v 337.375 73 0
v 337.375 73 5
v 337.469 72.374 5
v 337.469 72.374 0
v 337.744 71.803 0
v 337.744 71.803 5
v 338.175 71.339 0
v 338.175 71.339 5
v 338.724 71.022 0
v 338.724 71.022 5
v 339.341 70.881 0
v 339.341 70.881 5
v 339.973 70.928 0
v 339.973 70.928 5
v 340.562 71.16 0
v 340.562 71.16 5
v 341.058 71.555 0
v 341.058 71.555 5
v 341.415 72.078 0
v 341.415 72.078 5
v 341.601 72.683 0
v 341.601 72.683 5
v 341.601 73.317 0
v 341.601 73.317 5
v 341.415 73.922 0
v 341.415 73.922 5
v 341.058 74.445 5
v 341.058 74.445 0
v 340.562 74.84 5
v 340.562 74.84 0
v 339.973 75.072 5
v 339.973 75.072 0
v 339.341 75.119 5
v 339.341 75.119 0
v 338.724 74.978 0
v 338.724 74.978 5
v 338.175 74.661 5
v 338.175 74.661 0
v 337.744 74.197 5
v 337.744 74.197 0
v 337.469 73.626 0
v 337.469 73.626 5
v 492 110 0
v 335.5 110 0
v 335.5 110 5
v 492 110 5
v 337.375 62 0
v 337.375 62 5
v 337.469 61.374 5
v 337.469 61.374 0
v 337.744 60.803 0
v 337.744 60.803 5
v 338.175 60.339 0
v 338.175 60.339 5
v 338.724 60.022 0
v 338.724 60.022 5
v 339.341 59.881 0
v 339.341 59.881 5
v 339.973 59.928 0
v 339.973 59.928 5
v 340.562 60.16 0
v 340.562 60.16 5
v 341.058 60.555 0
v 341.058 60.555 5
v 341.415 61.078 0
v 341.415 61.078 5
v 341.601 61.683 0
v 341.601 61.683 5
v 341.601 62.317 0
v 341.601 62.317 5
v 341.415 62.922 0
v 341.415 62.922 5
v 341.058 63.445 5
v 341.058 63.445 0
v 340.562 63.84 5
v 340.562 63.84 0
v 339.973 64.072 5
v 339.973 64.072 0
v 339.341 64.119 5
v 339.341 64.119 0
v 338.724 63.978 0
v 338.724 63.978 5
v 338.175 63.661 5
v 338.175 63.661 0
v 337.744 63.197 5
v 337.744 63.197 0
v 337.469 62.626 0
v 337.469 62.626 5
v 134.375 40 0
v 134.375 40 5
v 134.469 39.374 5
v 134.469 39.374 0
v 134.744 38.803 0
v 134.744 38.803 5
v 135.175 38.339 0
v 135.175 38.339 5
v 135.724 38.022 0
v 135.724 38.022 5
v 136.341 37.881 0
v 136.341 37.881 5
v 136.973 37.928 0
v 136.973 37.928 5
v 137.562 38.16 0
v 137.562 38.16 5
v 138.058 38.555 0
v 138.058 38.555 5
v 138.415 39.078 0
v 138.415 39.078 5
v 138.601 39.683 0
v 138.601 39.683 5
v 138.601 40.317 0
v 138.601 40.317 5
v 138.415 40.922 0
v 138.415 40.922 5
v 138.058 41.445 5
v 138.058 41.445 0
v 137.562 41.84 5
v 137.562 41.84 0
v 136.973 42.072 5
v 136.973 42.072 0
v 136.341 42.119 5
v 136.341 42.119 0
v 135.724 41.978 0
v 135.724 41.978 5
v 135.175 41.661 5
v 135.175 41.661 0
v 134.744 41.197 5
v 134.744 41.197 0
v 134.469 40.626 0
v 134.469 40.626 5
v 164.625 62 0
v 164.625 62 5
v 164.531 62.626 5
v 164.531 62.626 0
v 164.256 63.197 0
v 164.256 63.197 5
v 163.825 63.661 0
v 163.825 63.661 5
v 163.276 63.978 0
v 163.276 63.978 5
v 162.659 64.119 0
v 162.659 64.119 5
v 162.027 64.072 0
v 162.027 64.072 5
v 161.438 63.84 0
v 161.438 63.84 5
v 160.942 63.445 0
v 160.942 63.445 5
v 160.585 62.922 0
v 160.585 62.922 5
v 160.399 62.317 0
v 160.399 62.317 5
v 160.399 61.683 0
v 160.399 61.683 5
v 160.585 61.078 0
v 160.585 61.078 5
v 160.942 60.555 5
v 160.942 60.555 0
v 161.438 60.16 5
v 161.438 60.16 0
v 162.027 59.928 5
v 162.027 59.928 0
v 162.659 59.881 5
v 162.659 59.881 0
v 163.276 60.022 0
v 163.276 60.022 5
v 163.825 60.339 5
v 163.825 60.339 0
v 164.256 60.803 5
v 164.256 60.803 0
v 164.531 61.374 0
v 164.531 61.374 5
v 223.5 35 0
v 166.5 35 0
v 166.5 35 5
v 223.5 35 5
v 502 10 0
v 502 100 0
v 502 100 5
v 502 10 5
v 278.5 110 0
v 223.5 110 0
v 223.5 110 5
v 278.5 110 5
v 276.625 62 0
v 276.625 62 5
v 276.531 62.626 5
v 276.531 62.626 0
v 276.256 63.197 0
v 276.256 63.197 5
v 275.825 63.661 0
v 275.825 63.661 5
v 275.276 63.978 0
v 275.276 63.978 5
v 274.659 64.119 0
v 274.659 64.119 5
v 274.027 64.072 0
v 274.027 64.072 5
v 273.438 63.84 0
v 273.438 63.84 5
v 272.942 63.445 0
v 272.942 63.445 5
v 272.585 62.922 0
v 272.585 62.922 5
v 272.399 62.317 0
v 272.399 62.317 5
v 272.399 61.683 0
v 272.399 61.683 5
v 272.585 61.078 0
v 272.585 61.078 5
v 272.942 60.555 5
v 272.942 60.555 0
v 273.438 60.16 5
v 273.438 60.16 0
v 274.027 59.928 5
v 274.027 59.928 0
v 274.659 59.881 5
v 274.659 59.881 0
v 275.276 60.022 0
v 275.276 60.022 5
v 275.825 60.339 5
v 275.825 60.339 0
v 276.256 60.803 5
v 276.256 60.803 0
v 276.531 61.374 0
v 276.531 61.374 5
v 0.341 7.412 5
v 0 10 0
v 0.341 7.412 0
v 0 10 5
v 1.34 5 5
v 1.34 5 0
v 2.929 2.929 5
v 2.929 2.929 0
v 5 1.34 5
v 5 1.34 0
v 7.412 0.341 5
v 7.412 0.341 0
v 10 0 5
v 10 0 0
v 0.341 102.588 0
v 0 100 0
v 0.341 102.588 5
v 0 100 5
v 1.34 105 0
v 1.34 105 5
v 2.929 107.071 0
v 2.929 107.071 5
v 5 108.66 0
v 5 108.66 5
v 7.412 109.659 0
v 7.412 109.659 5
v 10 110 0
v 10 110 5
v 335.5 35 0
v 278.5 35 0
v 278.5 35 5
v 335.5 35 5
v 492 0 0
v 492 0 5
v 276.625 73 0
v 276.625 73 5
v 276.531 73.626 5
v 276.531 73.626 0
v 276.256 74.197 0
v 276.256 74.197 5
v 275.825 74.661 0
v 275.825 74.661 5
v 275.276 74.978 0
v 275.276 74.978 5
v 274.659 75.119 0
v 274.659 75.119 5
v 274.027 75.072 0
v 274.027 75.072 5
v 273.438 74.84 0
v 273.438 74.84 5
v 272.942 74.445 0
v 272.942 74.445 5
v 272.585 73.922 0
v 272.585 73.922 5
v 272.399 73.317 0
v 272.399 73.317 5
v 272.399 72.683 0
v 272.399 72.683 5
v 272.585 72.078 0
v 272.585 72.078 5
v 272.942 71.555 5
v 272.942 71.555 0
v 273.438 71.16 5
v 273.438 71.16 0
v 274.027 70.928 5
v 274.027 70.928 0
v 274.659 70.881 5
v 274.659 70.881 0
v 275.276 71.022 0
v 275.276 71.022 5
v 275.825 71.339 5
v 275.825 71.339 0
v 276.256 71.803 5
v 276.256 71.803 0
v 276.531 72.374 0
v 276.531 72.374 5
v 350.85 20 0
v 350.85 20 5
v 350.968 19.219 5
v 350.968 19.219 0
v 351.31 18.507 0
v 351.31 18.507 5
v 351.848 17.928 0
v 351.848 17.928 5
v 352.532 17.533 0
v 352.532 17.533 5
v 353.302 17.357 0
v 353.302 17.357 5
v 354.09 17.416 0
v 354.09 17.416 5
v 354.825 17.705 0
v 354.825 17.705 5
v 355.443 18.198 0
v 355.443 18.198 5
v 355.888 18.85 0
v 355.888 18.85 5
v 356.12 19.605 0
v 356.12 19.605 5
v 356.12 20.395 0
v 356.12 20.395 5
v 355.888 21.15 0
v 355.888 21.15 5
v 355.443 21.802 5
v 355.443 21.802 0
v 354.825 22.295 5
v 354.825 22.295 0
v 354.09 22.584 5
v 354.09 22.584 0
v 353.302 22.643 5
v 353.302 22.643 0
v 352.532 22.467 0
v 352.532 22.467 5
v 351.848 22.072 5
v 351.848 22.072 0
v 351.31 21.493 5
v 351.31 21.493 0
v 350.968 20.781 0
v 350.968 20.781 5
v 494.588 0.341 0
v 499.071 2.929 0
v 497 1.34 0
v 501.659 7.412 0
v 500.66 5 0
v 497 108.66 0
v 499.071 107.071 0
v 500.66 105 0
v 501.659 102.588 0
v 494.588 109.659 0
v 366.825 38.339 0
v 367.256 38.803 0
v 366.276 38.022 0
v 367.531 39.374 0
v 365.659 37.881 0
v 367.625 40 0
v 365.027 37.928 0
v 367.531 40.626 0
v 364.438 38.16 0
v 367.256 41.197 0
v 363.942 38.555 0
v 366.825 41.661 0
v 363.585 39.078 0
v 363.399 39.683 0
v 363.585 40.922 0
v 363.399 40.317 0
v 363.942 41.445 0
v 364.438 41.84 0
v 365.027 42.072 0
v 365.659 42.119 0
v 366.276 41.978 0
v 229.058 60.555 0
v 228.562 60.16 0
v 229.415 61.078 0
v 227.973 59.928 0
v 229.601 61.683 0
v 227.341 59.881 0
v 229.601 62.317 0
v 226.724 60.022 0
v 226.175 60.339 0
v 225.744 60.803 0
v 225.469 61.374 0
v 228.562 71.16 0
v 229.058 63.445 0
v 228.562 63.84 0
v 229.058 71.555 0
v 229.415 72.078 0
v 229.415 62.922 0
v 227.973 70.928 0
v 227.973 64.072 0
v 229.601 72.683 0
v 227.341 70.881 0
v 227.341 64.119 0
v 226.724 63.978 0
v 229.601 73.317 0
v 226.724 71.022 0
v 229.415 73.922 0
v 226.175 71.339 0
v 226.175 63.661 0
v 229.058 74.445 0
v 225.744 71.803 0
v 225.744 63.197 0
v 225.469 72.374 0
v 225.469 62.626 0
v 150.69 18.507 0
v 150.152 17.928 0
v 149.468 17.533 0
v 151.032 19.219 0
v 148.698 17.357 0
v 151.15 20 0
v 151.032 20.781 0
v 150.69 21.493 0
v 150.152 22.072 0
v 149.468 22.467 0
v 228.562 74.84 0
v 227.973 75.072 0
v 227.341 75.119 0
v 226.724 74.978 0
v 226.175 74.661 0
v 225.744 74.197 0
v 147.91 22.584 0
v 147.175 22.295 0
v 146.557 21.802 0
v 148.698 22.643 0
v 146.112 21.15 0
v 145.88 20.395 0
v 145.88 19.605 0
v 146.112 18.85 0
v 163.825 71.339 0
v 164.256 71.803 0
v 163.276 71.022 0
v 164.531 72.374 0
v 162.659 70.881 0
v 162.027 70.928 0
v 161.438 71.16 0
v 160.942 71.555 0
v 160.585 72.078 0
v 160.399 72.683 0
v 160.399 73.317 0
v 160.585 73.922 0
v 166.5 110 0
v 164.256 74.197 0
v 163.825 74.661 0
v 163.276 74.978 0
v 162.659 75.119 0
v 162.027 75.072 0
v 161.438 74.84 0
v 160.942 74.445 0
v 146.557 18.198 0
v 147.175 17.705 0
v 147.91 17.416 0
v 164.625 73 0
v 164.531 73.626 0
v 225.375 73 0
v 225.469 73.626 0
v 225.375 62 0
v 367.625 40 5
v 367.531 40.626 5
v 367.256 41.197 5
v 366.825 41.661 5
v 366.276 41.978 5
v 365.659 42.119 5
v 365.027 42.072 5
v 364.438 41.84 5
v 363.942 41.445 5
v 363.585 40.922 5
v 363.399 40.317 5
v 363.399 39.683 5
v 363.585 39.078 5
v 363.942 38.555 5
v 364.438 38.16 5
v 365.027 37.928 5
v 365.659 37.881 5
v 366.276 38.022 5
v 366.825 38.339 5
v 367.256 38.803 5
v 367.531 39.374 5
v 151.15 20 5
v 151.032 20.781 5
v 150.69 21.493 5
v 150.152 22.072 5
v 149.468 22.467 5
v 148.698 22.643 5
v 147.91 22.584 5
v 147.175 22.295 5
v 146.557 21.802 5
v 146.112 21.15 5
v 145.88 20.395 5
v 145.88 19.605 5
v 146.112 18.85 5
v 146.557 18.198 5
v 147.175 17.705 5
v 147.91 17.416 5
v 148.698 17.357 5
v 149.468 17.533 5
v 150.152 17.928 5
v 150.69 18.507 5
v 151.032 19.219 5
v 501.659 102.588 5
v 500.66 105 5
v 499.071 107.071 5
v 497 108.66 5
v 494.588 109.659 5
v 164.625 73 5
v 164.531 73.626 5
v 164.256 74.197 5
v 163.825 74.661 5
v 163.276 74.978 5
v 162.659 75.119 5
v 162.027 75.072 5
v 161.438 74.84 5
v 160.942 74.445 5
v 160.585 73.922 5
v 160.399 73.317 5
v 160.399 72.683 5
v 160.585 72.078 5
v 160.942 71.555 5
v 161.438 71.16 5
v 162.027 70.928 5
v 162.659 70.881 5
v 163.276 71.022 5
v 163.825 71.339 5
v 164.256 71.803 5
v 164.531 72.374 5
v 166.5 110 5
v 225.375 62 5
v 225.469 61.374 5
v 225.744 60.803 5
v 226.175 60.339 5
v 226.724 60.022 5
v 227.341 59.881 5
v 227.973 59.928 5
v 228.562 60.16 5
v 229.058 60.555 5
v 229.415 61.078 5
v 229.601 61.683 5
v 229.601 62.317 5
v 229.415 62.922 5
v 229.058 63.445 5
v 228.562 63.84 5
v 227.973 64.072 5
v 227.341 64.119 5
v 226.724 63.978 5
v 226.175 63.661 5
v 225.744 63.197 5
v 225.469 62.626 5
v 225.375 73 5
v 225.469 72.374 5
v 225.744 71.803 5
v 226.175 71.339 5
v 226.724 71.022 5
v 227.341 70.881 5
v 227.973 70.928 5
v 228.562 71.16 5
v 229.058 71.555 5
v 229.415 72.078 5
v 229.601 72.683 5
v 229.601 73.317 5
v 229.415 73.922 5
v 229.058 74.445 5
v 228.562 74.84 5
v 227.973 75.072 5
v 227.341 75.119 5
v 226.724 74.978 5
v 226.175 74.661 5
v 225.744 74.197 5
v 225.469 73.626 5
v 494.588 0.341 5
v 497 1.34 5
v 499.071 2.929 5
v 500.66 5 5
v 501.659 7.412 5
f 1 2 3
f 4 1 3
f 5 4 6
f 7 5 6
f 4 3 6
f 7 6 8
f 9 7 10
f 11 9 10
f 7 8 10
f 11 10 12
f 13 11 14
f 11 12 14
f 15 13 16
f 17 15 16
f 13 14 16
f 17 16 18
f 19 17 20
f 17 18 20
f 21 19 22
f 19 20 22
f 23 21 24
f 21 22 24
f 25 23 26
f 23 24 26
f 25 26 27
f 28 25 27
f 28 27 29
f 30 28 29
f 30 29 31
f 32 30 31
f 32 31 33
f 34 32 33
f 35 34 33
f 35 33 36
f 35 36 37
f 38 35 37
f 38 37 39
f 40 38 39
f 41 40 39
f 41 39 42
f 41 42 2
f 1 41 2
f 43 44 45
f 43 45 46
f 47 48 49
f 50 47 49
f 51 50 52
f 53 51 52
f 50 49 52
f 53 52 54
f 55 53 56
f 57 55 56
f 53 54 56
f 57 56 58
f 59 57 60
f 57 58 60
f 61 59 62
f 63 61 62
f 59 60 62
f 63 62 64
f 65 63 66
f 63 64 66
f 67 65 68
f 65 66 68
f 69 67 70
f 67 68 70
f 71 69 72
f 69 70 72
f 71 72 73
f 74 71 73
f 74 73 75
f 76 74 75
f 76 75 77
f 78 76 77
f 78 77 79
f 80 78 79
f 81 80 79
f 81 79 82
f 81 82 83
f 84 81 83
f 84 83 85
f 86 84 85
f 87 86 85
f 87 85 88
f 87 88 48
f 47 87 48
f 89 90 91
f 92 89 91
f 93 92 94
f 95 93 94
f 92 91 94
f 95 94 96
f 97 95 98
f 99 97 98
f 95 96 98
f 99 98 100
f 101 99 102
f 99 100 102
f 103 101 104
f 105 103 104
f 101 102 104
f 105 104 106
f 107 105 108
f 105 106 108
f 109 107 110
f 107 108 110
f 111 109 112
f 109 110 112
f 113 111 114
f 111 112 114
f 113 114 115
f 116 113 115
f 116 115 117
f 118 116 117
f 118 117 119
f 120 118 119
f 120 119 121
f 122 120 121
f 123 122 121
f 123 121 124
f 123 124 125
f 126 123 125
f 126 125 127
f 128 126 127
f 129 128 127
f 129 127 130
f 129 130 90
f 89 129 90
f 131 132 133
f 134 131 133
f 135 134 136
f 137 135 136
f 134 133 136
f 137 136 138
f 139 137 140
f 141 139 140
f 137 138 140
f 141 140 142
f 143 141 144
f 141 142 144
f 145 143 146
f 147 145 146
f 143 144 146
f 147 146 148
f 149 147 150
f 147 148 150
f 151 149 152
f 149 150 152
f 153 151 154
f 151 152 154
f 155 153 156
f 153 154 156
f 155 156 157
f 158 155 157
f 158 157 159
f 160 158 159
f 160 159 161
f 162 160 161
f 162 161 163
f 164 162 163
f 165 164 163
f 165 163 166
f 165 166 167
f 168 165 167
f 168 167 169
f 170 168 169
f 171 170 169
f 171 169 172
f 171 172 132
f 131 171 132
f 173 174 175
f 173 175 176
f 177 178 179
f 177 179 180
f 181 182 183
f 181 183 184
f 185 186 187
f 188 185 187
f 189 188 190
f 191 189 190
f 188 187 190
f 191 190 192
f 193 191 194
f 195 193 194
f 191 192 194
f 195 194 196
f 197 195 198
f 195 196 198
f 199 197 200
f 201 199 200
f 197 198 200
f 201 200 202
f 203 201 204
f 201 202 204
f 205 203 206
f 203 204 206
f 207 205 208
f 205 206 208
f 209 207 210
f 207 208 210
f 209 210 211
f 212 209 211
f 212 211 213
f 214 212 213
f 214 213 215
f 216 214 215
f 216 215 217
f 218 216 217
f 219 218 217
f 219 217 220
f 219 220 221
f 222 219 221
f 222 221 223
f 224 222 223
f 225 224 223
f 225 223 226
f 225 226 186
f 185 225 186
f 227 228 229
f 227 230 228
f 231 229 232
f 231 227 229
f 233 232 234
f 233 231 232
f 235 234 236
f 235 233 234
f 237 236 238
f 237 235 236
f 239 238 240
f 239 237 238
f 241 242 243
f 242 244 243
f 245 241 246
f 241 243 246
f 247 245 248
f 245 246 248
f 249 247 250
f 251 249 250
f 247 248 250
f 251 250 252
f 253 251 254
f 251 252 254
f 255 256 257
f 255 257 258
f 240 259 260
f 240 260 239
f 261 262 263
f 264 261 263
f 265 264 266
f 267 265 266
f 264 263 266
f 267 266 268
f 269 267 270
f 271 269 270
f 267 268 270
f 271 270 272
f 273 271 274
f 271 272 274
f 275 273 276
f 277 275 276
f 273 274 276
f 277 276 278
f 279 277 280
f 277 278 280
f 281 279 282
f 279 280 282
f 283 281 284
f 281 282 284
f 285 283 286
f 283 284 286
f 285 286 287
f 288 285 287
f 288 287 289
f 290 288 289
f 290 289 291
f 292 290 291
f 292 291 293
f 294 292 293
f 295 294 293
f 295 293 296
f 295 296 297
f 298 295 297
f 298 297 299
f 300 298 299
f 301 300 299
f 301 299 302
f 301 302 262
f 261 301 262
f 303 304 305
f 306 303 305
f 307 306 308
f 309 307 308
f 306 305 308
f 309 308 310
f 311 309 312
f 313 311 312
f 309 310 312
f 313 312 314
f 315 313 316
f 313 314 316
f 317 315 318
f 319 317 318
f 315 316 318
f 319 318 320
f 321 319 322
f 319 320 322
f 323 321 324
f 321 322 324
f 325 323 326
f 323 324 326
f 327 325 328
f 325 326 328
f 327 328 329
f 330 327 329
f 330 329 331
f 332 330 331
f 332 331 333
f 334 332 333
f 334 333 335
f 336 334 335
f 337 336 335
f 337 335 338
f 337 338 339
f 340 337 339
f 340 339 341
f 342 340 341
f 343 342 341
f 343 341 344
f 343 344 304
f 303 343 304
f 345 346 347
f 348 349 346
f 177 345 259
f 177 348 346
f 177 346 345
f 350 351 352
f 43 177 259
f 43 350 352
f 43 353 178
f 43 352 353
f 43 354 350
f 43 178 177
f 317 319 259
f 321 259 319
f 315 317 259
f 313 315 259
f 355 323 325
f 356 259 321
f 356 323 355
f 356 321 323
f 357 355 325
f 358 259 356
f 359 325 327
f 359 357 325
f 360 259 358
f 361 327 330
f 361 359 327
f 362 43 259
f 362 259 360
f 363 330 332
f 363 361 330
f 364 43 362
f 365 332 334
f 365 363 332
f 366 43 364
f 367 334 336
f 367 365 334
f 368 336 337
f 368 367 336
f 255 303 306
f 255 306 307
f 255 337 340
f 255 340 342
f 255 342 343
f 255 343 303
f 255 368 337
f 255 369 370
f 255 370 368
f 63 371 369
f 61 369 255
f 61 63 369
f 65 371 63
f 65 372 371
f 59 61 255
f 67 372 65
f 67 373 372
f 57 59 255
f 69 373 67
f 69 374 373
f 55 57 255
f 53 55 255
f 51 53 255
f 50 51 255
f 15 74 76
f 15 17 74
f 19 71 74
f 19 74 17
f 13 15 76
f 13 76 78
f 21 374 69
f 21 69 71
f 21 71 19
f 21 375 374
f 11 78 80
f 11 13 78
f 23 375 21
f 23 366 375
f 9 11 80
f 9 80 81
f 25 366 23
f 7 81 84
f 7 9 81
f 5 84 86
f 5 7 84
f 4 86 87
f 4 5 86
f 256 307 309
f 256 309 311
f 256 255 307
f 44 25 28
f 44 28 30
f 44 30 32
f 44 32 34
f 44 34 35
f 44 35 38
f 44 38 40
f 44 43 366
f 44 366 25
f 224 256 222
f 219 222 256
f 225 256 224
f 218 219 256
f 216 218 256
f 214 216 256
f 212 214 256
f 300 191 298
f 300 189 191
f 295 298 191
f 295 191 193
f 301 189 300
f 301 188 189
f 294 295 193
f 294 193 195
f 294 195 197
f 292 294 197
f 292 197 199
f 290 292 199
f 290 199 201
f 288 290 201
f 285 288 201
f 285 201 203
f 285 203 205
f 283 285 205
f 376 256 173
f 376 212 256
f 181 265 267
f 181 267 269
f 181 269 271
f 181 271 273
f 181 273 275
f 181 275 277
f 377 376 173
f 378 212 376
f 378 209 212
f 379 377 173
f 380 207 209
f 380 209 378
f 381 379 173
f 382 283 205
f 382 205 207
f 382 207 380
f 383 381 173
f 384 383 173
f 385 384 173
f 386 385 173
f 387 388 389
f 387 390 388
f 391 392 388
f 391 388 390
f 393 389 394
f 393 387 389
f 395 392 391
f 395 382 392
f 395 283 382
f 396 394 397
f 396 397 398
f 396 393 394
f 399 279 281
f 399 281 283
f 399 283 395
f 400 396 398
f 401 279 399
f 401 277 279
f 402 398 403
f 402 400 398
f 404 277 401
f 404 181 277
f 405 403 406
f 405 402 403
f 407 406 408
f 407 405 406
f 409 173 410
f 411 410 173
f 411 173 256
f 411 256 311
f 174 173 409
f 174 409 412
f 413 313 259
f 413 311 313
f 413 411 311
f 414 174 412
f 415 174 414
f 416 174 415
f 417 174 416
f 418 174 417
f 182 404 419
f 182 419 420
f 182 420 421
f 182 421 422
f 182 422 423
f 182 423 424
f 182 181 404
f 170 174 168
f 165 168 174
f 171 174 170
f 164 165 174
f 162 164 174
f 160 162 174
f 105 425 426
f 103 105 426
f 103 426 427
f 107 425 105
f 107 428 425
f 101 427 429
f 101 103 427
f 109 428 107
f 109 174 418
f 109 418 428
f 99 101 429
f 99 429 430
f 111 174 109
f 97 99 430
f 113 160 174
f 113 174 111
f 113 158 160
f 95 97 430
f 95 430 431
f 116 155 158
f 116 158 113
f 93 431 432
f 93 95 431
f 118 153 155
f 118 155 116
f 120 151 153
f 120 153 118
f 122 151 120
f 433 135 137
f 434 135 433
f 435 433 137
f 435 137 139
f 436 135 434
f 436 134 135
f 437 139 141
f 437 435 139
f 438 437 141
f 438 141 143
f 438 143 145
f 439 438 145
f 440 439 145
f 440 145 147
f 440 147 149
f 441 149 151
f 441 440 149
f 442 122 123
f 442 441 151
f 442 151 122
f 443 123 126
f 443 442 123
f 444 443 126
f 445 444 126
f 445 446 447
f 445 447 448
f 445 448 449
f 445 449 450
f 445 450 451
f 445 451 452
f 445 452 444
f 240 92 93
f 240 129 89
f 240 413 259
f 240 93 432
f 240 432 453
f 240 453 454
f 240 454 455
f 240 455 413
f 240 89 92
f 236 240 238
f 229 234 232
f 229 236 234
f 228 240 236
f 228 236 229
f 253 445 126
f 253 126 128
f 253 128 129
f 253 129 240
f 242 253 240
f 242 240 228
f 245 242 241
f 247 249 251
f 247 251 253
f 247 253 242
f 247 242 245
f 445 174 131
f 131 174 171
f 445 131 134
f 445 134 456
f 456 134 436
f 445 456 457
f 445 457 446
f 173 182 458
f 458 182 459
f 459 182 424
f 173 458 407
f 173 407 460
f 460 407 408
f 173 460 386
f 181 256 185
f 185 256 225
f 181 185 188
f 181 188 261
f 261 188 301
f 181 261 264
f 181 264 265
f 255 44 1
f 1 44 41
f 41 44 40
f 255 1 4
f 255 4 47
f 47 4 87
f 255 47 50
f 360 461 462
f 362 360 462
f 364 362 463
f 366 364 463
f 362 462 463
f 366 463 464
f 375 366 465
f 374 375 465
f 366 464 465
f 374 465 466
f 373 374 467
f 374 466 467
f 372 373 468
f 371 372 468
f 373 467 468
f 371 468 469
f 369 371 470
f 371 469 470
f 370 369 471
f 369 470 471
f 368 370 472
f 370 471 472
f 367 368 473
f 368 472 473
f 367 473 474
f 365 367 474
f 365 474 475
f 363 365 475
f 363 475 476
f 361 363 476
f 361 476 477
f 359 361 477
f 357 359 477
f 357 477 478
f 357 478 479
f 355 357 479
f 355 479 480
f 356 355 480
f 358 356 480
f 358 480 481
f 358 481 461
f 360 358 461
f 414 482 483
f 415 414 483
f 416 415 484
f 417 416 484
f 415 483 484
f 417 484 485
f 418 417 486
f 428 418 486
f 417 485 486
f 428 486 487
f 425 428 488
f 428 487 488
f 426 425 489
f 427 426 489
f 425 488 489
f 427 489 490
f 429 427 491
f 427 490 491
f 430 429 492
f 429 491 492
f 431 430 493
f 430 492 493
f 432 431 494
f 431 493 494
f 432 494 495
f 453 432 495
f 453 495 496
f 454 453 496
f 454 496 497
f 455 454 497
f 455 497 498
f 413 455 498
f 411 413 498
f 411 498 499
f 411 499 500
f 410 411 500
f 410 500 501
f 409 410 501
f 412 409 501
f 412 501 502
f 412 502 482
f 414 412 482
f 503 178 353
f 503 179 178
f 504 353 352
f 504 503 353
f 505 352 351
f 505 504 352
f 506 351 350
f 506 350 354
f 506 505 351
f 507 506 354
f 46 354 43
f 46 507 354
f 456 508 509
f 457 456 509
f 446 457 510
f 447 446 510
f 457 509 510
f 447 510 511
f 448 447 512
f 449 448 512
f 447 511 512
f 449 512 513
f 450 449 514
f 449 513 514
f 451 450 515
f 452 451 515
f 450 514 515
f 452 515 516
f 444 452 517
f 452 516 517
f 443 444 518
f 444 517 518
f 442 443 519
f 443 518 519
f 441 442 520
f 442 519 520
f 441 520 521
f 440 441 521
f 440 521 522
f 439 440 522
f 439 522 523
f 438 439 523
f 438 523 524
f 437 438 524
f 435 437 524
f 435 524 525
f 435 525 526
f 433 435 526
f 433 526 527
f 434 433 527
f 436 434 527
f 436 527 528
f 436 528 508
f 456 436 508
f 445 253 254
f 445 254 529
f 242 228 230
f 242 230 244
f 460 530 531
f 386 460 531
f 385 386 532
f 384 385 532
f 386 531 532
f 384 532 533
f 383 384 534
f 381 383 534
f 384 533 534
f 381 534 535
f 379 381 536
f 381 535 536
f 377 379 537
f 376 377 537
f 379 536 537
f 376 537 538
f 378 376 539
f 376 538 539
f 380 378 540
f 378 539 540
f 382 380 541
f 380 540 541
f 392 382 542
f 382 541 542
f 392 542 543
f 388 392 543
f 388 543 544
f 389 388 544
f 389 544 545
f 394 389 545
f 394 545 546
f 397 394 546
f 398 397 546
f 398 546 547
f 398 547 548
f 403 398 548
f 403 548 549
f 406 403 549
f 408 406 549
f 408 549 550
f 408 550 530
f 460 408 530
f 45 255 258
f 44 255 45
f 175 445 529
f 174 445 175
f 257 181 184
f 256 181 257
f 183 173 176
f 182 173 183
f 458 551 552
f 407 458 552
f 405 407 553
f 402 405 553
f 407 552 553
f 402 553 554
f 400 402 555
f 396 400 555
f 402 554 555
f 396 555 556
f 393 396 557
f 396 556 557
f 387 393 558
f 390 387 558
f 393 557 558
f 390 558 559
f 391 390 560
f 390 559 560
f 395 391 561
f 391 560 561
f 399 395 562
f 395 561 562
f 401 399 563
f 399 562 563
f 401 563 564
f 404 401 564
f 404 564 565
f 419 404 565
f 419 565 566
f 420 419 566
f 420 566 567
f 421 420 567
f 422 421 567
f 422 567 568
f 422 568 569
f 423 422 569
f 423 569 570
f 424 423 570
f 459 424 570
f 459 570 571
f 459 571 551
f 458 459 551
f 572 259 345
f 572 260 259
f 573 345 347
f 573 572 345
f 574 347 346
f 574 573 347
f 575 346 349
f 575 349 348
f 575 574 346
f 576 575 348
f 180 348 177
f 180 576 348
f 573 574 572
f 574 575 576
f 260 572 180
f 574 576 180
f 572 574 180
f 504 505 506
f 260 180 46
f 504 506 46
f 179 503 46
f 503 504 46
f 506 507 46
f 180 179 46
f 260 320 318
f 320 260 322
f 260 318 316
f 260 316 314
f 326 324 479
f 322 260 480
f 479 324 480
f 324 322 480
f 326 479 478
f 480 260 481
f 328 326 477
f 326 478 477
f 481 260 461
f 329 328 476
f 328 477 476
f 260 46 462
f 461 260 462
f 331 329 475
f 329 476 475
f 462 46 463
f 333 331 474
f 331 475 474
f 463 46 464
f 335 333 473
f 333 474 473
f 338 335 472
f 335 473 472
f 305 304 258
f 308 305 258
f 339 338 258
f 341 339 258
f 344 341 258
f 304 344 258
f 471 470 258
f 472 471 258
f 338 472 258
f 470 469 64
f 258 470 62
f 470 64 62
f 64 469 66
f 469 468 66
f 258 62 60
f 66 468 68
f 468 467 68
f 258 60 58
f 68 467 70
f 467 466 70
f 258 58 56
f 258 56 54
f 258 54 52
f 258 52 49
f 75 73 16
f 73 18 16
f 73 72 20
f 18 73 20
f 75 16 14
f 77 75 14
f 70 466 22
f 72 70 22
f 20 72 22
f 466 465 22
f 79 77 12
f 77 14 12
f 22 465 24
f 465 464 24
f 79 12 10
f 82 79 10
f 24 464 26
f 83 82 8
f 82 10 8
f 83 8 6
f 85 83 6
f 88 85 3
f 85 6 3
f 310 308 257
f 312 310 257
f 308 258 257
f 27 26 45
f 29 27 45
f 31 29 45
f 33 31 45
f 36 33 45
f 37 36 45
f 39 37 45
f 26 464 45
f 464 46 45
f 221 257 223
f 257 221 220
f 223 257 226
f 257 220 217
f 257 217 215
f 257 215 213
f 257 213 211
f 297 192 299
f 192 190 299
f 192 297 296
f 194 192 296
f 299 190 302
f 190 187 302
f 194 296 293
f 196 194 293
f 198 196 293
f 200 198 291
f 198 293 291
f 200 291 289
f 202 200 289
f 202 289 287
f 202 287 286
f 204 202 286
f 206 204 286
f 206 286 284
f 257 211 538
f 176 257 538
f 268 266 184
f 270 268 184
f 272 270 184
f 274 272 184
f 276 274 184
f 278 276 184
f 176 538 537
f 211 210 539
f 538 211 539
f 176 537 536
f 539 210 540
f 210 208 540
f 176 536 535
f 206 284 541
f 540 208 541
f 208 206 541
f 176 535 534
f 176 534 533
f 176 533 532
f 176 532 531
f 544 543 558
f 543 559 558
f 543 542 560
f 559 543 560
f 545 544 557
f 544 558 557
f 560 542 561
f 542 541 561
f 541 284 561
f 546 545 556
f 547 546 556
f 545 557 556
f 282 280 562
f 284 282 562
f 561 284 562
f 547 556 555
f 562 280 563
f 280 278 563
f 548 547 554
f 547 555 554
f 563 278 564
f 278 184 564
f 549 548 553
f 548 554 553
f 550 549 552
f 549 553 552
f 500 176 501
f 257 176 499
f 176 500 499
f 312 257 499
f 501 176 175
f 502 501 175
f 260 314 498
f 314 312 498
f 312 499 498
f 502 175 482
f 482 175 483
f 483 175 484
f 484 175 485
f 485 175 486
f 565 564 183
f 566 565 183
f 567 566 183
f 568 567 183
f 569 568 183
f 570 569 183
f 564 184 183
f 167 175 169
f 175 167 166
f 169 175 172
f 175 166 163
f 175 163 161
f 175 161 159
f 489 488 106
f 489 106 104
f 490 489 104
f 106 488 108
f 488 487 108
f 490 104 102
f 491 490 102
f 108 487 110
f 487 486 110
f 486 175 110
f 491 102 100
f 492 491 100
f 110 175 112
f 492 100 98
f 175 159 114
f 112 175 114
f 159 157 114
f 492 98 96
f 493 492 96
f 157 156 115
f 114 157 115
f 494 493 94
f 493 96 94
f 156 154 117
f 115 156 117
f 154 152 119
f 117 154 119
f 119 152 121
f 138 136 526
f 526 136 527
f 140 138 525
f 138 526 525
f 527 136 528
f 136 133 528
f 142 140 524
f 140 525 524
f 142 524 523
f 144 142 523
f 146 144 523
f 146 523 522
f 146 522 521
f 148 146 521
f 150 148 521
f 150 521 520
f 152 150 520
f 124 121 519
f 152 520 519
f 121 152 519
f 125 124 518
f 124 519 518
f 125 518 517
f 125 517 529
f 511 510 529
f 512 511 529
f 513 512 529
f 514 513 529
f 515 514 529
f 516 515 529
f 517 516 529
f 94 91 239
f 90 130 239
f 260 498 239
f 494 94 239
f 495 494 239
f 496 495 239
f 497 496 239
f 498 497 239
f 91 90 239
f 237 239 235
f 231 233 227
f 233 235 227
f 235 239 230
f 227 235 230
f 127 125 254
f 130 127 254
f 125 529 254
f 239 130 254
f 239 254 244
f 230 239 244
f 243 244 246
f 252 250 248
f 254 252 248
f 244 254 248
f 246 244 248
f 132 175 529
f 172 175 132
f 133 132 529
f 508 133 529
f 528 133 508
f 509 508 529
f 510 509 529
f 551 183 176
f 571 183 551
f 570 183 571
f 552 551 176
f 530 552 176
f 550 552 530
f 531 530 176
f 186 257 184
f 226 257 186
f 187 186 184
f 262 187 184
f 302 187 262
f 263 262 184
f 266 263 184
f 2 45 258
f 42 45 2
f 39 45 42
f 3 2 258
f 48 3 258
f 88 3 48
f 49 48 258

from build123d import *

# Parameters (mm, degrees)
BOSS_EXTRUDE1_DEPTH = 5
SKETCH3_R           = 2.125
CUT_EXTRUDE1_DEPTH  = 10
FILLET1_R           = 10
SKETCH4_R           = 2.65
CUT_EXTRUDE2_DEPTH  = 10
SKETCH5_R           = 2.125
CUT_EXTRUDE3_DEPTH  = 10


with BuildPart() as part:
    # Sketch1 → Boss-Extrude1 (new body)
    with BuildSketch(Plane.XY):
        Polygon((0, 0), (0, 110), (166.5, 110), (166.5, 35), (223.5, 35), (223.5, 110), (278.5, 110), (278.5, 35), (335.5, 35), (335.5, 110), (502, 110), (502, 0), align=None)
    extrude(amount=BOSS_EXTRUDE1_DEPTH)

    # Sketch3 → Cut-Extrude1 (cut)
    with BuildSketch(Plane.XY.offset(5)):
        with Locations((162.5, 73)):
            Circle(SKETCH3_R)
        with Locations((162.5, 62)):
            Circle(SKETCH3_R)
        with Locations(Location((227.5, 62, 0), (0, 0, 180))):
            Circle(SKETCH3_R)
        with Locations(Location((227.5, 73, 0), (0, 0, 180))):
            Circle(SKETCH3_R)
        with Locations((274.5, 73)):
            Circle(SKETCH3_R)
        with Locations((274.5, 62)):
            Circle(SKETCH3_R)
        with Locations(Location((339.5, 62, 0), (0, 0, 180))):
            Circle(SKETCH3_R)
        with Locations(Location((339.5, 73, 0), (0, 0, 180))):
            Circle(SKETCH3_R)
    extrude(amount=-CUT_EXTRUDE1_DEPTH, mode=Mode.SUBTRACT)

    # Fillet1
    fillet1_edges = [part.edges().sort_by_distance(p)[0] for p in [
        (0, 0, 2.5),
        (0, 110, 2.5),
        (502, 110, 2.5),
        (502, 0, 2.5),
    ]]
    fillet(fillet1_edges, radius=FILLET1_R)

    # Sketch4 → Cut-Extrude2 (cut)
    with BuildSketch(Plane.XY.offset(5)):
        with Locations((148.5, 20)):
            Circle(SKETCH4_R)
        with Locations(Location((353.5, 20, 0), (0, 0, 180))):
            Circle(SKETCH4_R)
    extrude(amount=-CUT_EXTRUDE2_DEPTH, mode=Mode.SUBTRACT)

    # Sketch5 → Cut-Extrude3 (cut)
    with BuildSketch(Plane.XY.offset(5)):
        with Locations((365.5, 40)):
            Circle(SKETCH5_R)
        with Locations(Location((136.5, 40, 0), (0, 0, 180))):
            Circle(SKETCH5_R)
    extrude(amount=-CUT_EXTRUDE3_DEPTH, mode=Mode.SUBTRACT)


solid = part.part
